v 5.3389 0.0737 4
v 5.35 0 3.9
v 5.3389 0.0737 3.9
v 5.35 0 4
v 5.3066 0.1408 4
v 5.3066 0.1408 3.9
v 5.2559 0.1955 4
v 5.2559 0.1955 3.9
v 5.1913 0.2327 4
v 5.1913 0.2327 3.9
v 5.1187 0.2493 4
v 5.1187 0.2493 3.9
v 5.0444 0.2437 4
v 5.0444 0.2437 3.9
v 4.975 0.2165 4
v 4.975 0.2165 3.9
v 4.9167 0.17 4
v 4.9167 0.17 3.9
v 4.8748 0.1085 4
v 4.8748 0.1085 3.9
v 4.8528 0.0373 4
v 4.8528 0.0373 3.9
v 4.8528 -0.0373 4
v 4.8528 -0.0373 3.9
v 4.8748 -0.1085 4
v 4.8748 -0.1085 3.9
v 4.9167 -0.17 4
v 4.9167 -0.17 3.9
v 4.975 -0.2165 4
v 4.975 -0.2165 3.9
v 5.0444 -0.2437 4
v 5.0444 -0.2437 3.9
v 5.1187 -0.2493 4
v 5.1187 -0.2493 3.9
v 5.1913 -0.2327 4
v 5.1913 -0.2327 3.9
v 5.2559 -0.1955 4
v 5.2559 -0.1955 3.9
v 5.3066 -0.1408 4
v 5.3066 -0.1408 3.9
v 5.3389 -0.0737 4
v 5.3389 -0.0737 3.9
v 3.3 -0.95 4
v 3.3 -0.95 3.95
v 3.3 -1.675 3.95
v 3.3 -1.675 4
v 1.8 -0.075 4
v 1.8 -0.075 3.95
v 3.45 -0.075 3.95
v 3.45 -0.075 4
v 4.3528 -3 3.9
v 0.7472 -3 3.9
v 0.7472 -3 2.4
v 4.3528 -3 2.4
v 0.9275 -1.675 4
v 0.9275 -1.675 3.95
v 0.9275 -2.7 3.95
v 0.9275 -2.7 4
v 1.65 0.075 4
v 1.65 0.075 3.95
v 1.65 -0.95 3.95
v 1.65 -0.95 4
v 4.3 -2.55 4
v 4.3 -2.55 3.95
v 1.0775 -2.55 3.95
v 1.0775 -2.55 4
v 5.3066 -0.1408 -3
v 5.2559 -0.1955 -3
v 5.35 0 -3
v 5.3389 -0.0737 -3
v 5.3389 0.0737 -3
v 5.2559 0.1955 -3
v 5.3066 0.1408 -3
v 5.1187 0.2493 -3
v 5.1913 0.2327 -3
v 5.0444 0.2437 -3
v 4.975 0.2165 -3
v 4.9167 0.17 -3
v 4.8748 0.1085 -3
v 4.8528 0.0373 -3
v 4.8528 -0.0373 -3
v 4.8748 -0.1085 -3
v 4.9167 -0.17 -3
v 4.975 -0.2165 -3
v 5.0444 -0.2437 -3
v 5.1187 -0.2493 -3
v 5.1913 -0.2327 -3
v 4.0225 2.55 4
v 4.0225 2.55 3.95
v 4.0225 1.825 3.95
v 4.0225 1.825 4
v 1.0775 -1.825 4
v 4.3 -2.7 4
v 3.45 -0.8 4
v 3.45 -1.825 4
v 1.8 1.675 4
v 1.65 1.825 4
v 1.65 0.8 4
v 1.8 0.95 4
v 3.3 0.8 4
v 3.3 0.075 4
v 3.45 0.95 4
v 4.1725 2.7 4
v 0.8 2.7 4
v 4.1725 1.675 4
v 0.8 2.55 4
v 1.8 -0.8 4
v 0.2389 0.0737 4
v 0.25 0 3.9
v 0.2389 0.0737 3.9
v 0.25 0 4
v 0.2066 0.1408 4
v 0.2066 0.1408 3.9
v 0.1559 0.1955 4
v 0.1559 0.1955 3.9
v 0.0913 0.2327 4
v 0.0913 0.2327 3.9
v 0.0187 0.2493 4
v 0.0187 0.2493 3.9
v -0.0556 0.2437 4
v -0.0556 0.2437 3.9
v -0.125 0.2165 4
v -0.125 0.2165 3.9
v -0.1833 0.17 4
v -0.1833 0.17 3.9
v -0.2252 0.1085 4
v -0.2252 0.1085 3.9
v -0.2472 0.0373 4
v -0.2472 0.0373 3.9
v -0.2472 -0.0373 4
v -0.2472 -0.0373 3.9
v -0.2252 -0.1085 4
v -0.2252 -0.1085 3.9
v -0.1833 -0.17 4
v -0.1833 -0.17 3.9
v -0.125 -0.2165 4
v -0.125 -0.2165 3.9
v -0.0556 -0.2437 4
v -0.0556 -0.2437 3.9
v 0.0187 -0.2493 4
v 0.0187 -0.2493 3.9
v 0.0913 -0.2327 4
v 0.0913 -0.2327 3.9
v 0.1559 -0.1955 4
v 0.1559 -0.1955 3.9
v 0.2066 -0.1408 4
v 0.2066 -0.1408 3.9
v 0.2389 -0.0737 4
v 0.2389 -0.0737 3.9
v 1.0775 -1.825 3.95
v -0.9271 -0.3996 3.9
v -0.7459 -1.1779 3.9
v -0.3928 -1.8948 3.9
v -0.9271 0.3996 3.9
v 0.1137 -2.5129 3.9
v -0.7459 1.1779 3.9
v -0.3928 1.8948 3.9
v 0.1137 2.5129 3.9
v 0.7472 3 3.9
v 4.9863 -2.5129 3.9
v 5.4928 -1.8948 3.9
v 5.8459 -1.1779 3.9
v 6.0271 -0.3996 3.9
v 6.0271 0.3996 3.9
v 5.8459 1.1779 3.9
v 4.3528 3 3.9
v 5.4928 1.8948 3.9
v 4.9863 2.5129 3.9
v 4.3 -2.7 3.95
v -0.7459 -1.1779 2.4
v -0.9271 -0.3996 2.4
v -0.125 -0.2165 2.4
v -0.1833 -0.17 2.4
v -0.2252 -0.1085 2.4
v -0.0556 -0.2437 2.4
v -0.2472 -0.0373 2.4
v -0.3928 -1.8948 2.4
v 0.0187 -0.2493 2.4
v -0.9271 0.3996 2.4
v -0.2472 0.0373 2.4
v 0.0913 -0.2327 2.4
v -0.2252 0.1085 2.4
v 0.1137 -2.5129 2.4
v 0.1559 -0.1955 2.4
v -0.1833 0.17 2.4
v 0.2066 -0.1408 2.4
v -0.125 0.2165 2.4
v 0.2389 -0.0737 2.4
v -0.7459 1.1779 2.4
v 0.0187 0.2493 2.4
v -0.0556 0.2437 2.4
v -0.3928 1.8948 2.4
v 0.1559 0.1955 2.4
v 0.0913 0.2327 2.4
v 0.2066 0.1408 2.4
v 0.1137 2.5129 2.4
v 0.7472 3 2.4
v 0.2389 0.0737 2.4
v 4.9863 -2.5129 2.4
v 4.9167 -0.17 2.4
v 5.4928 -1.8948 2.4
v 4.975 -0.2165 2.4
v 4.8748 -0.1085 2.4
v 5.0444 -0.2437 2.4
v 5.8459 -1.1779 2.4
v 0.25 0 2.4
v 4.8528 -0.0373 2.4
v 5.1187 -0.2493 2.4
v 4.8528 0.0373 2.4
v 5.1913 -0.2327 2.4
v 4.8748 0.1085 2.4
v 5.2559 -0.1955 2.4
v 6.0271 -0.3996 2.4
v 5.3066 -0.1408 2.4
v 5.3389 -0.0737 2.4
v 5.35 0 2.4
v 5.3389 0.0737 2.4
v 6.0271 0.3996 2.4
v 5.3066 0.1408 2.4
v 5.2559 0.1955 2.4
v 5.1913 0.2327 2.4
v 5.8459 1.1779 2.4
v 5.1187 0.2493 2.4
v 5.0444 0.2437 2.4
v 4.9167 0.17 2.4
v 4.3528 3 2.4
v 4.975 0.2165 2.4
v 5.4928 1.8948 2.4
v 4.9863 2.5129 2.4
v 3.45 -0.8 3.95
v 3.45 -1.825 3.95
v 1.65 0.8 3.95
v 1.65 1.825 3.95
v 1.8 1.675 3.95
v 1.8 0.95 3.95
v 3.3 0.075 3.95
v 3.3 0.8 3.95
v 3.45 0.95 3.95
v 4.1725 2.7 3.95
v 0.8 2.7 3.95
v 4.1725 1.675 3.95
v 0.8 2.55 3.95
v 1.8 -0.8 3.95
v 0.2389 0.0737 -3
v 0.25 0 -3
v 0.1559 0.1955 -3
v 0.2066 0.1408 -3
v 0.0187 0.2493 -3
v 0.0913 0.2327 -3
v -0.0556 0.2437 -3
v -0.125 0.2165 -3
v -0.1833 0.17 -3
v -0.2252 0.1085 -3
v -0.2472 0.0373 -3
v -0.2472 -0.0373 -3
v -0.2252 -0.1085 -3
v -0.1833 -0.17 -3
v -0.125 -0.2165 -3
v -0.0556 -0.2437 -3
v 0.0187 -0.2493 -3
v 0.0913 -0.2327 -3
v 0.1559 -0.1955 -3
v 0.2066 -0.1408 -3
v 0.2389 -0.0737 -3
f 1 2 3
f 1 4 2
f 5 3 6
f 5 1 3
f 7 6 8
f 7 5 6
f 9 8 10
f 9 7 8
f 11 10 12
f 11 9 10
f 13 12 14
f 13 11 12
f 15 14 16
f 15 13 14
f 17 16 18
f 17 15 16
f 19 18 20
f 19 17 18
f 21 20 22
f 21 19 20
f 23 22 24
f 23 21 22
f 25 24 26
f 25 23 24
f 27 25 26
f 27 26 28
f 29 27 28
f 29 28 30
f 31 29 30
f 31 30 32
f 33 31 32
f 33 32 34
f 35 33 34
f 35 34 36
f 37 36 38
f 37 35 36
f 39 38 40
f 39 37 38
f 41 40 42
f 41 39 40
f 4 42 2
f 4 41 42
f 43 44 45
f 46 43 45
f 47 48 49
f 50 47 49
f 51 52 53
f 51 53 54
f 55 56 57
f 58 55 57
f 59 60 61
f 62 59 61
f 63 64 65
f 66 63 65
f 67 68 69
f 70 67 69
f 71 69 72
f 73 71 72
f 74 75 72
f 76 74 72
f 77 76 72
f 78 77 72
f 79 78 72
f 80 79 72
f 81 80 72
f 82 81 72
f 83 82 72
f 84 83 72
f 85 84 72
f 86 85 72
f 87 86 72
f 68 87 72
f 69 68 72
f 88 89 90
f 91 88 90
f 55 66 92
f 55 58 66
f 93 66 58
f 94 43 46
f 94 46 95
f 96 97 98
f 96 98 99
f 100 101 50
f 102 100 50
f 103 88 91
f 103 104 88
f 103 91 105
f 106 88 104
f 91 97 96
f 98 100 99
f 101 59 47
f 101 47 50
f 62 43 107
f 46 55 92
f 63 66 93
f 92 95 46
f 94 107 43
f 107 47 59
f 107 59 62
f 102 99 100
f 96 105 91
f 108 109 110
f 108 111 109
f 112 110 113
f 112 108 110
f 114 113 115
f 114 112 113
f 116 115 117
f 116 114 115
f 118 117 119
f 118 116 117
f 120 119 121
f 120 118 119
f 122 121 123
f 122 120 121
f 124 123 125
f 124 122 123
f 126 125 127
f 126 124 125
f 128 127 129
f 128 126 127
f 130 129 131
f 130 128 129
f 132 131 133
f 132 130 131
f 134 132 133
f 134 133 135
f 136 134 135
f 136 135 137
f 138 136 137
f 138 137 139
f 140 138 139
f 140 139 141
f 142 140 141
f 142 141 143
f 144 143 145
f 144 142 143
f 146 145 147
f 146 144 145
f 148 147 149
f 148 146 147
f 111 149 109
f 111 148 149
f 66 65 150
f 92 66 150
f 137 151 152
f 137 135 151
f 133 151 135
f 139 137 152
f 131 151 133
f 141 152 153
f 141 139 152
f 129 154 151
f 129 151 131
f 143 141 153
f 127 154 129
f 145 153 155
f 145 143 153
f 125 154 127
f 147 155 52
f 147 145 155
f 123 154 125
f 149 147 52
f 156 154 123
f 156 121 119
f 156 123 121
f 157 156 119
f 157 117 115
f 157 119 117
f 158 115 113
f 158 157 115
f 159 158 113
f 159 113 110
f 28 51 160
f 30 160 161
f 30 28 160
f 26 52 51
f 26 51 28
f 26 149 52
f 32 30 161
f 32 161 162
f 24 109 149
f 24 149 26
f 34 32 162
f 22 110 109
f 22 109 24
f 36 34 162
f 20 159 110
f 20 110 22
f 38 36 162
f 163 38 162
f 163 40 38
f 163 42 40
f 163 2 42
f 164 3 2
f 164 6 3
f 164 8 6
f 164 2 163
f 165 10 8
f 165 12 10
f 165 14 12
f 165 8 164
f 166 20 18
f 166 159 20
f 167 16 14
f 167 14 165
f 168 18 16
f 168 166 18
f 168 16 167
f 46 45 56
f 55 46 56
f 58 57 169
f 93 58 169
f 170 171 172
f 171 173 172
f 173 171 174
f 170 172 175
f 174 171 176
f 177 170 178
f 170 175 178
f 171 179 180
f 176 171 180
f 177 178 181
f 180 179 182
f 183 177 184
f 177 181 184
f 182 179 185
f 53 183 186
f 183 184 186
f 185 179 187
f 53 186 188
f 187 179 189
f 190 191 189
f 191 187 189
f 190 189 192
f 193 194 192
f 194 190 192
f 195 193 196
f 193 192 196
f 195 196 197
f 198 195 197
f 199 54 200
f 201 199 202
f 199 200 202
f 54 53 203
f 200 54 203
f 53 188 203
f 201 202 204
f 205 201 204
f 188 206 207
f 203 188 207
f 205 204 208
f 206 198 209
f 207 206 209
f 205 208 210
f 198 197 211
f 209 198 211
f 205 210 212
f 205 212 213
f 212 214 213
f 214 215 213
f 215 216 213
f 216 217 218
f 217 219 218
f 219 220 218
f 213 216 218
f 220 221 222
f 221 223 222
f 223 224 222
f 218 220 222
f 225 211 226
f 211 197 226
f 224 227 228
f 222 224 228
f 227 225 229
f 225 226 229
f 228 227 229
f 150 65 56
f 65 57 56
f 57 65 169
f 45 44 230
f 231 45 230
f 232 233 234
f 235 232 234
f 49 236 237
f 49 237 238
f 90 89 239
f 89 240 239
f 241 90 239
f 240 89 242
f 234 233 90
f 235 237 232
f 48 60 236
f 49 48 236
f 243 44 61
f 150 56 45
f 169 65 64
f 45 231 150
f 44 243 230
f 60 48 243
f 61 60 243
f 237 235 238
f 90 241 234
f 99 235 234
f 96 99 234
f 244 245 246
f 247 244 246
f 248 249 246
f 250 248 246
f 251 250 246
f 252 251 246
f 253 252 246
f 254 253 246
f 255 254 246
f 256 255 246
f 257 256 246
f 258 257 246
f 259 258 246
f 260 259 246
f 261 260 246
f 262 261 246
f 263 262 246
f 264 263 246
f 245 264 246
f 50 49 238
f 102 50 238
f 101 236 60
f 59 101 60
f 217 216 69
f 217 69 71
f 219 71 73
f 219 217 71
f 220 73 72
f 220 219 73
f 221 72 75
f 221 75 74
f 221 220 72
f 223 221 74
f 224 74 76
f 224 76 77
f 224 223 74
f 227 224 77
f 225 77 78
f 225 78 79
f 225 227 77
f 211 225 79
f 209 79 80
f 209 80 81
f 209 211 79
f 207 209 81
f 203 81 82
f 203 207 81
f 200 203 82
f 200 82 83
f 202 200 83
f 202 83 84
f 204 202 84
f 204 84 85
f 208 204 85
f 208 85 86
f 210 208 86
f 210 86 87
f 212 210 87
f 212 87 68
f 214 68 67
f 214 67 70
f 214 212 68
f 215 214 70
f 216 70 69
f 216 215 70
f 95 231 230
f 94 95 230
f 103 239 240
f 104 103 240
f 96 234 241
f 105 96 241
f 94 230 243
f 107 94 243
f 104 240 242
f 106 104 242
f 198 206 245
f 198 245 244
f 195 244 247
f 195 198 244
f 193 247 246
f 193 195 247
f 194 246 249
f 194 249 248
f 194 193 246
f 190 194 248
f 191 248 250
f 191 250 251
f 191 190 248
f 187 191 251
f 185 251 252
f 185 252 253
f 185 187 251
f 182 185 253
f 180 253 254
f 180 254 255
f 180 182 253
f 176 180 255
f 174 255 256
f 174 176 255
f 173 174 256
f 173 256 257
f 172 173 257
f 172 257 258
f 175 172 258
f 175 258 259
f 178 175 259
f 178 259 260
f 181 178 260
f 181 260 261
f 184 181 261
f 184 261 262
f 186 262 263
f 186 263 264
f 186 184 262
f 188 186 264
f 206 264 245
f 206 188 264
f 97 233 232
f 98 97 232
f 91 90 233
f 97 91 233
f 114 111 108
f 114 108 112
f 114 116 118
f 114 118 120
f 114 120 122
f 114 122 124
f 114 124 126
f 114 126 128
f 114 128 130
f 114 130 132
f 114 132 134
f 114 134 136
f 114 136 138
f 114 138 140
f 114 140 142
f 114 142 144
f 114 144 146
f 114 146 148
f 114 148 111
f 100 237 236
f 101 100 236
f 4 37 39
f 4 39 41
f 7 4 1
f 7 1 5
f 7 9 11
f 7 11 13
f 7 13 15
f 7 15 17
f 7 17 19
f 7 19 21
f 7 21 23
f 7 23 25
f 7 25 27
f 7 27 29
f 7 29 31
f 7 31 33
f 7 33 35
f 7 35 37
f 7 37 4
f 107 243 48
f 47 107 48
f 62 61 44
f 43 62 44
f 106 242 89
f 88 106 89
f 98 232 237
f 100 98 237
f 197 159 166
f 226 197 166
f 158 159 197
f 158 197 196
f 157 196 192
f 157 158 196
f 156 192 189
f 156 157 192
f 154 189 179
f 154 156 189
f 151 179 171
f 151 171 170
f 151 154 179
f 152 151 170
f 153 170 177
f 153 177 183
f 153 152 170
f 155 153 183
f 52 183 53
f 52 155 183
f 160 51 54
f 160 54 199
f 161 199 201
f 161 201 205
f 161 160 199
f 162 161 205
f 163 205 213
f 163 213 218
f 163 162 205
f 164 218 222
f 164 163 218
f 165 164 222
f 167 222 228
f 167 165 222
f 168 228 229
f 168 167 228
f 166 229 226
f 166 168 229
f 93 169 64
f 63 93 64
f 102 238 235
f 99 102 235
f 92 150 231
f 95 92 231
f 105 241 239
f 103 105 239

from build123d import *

# Parameters (mm, degrees)
PAD001_DEPTH   = 1.5
SKETCH_R       = 0.25
PAD_DEPTH      = 4
PAD_DEPTH_BACK = 3
PAD002_DEPTH   = 0.05


with BuildPart() as pad001:
    # Sketch001 → Pad001 (new body)
    with BuildSketch(Plane.XY.offset(3.9)):
        with BuildLine():
            ThreePointArc((0.747224, 3), (-0.95, 0), (0.747224, -3))
            Line((0.747224, -3), (4.352776, -3))
            ThreePointArc((4.352776, -3), (6.05, 0), (4.352776, 3))
            Line((0.747224, 3), (4.352776, 3))
        make_face()
    extrude(amount=-PAD001_DEPTH)


with BuildPart() as pad:
    # Sketch → Pad (new body, two sides)
    with BuildSketch(Plane.XY) as pad_sk:
        Circle(SKETCH_R)
        with Locations((5.1, 0)):
            Circle(SKETCH_R)
    extrude(amount=PAD_DEPTH)
    extrude(pad_sk.sketch, amount=-PAD_DEPTH_BACK)


with BuildPart() as r_ldr_7x6mm_p5_1mm_vertical:
    # Sketch002 → Pad002 (new body)
    with BuildSketch(Plane.XY.offset(3.95)):
        Polygon((0.8, 2.55), (4.0225, 2.55), (4.0225, 1.825), (1.65, 1.825), (1.65, 1.675), (1.65, 0.8), (1.8, 0.8), (3.3, 0.8), (3.3, 0.075), (1.65, 0.075), (1.65, -0.075), (1.65, -0.95), (1.8, -0.95), (3.3, -0.95), (3.3, -1.675), (0.9275, -1.675), (0.9275, -1.825), (0.9275, -2.7), (1.0775, -2.7), (4.3, -2.7), (4.3, -2.55), (1.0775, -2.55), (1.0775, -1.825), (3.3, -1.825), (3.45, -1.825), (3.45, -0.95), (3.45, -0.8), (1.8, -0.8), (1.8, -0.075), (3.3, -0.075), (3.45, -0.075), (3.45, 0.8), (3.45, 0.95), (1.8, 0.95), (1.8, 1.675), (4.0225, 1.675), (4.1725, 1.675), (4.1725, 2.55), (4.1725, 2.7), (0.8, 2.7), align=None)
    extrude(amount=PAD002_DEPTH)

    # Pad002_mp_cp: union Pad001, Pad
    add(pad001.part)
    add(pad.part)


solid = r_ldr_7x6mm_p5_1mm_vertical.part
